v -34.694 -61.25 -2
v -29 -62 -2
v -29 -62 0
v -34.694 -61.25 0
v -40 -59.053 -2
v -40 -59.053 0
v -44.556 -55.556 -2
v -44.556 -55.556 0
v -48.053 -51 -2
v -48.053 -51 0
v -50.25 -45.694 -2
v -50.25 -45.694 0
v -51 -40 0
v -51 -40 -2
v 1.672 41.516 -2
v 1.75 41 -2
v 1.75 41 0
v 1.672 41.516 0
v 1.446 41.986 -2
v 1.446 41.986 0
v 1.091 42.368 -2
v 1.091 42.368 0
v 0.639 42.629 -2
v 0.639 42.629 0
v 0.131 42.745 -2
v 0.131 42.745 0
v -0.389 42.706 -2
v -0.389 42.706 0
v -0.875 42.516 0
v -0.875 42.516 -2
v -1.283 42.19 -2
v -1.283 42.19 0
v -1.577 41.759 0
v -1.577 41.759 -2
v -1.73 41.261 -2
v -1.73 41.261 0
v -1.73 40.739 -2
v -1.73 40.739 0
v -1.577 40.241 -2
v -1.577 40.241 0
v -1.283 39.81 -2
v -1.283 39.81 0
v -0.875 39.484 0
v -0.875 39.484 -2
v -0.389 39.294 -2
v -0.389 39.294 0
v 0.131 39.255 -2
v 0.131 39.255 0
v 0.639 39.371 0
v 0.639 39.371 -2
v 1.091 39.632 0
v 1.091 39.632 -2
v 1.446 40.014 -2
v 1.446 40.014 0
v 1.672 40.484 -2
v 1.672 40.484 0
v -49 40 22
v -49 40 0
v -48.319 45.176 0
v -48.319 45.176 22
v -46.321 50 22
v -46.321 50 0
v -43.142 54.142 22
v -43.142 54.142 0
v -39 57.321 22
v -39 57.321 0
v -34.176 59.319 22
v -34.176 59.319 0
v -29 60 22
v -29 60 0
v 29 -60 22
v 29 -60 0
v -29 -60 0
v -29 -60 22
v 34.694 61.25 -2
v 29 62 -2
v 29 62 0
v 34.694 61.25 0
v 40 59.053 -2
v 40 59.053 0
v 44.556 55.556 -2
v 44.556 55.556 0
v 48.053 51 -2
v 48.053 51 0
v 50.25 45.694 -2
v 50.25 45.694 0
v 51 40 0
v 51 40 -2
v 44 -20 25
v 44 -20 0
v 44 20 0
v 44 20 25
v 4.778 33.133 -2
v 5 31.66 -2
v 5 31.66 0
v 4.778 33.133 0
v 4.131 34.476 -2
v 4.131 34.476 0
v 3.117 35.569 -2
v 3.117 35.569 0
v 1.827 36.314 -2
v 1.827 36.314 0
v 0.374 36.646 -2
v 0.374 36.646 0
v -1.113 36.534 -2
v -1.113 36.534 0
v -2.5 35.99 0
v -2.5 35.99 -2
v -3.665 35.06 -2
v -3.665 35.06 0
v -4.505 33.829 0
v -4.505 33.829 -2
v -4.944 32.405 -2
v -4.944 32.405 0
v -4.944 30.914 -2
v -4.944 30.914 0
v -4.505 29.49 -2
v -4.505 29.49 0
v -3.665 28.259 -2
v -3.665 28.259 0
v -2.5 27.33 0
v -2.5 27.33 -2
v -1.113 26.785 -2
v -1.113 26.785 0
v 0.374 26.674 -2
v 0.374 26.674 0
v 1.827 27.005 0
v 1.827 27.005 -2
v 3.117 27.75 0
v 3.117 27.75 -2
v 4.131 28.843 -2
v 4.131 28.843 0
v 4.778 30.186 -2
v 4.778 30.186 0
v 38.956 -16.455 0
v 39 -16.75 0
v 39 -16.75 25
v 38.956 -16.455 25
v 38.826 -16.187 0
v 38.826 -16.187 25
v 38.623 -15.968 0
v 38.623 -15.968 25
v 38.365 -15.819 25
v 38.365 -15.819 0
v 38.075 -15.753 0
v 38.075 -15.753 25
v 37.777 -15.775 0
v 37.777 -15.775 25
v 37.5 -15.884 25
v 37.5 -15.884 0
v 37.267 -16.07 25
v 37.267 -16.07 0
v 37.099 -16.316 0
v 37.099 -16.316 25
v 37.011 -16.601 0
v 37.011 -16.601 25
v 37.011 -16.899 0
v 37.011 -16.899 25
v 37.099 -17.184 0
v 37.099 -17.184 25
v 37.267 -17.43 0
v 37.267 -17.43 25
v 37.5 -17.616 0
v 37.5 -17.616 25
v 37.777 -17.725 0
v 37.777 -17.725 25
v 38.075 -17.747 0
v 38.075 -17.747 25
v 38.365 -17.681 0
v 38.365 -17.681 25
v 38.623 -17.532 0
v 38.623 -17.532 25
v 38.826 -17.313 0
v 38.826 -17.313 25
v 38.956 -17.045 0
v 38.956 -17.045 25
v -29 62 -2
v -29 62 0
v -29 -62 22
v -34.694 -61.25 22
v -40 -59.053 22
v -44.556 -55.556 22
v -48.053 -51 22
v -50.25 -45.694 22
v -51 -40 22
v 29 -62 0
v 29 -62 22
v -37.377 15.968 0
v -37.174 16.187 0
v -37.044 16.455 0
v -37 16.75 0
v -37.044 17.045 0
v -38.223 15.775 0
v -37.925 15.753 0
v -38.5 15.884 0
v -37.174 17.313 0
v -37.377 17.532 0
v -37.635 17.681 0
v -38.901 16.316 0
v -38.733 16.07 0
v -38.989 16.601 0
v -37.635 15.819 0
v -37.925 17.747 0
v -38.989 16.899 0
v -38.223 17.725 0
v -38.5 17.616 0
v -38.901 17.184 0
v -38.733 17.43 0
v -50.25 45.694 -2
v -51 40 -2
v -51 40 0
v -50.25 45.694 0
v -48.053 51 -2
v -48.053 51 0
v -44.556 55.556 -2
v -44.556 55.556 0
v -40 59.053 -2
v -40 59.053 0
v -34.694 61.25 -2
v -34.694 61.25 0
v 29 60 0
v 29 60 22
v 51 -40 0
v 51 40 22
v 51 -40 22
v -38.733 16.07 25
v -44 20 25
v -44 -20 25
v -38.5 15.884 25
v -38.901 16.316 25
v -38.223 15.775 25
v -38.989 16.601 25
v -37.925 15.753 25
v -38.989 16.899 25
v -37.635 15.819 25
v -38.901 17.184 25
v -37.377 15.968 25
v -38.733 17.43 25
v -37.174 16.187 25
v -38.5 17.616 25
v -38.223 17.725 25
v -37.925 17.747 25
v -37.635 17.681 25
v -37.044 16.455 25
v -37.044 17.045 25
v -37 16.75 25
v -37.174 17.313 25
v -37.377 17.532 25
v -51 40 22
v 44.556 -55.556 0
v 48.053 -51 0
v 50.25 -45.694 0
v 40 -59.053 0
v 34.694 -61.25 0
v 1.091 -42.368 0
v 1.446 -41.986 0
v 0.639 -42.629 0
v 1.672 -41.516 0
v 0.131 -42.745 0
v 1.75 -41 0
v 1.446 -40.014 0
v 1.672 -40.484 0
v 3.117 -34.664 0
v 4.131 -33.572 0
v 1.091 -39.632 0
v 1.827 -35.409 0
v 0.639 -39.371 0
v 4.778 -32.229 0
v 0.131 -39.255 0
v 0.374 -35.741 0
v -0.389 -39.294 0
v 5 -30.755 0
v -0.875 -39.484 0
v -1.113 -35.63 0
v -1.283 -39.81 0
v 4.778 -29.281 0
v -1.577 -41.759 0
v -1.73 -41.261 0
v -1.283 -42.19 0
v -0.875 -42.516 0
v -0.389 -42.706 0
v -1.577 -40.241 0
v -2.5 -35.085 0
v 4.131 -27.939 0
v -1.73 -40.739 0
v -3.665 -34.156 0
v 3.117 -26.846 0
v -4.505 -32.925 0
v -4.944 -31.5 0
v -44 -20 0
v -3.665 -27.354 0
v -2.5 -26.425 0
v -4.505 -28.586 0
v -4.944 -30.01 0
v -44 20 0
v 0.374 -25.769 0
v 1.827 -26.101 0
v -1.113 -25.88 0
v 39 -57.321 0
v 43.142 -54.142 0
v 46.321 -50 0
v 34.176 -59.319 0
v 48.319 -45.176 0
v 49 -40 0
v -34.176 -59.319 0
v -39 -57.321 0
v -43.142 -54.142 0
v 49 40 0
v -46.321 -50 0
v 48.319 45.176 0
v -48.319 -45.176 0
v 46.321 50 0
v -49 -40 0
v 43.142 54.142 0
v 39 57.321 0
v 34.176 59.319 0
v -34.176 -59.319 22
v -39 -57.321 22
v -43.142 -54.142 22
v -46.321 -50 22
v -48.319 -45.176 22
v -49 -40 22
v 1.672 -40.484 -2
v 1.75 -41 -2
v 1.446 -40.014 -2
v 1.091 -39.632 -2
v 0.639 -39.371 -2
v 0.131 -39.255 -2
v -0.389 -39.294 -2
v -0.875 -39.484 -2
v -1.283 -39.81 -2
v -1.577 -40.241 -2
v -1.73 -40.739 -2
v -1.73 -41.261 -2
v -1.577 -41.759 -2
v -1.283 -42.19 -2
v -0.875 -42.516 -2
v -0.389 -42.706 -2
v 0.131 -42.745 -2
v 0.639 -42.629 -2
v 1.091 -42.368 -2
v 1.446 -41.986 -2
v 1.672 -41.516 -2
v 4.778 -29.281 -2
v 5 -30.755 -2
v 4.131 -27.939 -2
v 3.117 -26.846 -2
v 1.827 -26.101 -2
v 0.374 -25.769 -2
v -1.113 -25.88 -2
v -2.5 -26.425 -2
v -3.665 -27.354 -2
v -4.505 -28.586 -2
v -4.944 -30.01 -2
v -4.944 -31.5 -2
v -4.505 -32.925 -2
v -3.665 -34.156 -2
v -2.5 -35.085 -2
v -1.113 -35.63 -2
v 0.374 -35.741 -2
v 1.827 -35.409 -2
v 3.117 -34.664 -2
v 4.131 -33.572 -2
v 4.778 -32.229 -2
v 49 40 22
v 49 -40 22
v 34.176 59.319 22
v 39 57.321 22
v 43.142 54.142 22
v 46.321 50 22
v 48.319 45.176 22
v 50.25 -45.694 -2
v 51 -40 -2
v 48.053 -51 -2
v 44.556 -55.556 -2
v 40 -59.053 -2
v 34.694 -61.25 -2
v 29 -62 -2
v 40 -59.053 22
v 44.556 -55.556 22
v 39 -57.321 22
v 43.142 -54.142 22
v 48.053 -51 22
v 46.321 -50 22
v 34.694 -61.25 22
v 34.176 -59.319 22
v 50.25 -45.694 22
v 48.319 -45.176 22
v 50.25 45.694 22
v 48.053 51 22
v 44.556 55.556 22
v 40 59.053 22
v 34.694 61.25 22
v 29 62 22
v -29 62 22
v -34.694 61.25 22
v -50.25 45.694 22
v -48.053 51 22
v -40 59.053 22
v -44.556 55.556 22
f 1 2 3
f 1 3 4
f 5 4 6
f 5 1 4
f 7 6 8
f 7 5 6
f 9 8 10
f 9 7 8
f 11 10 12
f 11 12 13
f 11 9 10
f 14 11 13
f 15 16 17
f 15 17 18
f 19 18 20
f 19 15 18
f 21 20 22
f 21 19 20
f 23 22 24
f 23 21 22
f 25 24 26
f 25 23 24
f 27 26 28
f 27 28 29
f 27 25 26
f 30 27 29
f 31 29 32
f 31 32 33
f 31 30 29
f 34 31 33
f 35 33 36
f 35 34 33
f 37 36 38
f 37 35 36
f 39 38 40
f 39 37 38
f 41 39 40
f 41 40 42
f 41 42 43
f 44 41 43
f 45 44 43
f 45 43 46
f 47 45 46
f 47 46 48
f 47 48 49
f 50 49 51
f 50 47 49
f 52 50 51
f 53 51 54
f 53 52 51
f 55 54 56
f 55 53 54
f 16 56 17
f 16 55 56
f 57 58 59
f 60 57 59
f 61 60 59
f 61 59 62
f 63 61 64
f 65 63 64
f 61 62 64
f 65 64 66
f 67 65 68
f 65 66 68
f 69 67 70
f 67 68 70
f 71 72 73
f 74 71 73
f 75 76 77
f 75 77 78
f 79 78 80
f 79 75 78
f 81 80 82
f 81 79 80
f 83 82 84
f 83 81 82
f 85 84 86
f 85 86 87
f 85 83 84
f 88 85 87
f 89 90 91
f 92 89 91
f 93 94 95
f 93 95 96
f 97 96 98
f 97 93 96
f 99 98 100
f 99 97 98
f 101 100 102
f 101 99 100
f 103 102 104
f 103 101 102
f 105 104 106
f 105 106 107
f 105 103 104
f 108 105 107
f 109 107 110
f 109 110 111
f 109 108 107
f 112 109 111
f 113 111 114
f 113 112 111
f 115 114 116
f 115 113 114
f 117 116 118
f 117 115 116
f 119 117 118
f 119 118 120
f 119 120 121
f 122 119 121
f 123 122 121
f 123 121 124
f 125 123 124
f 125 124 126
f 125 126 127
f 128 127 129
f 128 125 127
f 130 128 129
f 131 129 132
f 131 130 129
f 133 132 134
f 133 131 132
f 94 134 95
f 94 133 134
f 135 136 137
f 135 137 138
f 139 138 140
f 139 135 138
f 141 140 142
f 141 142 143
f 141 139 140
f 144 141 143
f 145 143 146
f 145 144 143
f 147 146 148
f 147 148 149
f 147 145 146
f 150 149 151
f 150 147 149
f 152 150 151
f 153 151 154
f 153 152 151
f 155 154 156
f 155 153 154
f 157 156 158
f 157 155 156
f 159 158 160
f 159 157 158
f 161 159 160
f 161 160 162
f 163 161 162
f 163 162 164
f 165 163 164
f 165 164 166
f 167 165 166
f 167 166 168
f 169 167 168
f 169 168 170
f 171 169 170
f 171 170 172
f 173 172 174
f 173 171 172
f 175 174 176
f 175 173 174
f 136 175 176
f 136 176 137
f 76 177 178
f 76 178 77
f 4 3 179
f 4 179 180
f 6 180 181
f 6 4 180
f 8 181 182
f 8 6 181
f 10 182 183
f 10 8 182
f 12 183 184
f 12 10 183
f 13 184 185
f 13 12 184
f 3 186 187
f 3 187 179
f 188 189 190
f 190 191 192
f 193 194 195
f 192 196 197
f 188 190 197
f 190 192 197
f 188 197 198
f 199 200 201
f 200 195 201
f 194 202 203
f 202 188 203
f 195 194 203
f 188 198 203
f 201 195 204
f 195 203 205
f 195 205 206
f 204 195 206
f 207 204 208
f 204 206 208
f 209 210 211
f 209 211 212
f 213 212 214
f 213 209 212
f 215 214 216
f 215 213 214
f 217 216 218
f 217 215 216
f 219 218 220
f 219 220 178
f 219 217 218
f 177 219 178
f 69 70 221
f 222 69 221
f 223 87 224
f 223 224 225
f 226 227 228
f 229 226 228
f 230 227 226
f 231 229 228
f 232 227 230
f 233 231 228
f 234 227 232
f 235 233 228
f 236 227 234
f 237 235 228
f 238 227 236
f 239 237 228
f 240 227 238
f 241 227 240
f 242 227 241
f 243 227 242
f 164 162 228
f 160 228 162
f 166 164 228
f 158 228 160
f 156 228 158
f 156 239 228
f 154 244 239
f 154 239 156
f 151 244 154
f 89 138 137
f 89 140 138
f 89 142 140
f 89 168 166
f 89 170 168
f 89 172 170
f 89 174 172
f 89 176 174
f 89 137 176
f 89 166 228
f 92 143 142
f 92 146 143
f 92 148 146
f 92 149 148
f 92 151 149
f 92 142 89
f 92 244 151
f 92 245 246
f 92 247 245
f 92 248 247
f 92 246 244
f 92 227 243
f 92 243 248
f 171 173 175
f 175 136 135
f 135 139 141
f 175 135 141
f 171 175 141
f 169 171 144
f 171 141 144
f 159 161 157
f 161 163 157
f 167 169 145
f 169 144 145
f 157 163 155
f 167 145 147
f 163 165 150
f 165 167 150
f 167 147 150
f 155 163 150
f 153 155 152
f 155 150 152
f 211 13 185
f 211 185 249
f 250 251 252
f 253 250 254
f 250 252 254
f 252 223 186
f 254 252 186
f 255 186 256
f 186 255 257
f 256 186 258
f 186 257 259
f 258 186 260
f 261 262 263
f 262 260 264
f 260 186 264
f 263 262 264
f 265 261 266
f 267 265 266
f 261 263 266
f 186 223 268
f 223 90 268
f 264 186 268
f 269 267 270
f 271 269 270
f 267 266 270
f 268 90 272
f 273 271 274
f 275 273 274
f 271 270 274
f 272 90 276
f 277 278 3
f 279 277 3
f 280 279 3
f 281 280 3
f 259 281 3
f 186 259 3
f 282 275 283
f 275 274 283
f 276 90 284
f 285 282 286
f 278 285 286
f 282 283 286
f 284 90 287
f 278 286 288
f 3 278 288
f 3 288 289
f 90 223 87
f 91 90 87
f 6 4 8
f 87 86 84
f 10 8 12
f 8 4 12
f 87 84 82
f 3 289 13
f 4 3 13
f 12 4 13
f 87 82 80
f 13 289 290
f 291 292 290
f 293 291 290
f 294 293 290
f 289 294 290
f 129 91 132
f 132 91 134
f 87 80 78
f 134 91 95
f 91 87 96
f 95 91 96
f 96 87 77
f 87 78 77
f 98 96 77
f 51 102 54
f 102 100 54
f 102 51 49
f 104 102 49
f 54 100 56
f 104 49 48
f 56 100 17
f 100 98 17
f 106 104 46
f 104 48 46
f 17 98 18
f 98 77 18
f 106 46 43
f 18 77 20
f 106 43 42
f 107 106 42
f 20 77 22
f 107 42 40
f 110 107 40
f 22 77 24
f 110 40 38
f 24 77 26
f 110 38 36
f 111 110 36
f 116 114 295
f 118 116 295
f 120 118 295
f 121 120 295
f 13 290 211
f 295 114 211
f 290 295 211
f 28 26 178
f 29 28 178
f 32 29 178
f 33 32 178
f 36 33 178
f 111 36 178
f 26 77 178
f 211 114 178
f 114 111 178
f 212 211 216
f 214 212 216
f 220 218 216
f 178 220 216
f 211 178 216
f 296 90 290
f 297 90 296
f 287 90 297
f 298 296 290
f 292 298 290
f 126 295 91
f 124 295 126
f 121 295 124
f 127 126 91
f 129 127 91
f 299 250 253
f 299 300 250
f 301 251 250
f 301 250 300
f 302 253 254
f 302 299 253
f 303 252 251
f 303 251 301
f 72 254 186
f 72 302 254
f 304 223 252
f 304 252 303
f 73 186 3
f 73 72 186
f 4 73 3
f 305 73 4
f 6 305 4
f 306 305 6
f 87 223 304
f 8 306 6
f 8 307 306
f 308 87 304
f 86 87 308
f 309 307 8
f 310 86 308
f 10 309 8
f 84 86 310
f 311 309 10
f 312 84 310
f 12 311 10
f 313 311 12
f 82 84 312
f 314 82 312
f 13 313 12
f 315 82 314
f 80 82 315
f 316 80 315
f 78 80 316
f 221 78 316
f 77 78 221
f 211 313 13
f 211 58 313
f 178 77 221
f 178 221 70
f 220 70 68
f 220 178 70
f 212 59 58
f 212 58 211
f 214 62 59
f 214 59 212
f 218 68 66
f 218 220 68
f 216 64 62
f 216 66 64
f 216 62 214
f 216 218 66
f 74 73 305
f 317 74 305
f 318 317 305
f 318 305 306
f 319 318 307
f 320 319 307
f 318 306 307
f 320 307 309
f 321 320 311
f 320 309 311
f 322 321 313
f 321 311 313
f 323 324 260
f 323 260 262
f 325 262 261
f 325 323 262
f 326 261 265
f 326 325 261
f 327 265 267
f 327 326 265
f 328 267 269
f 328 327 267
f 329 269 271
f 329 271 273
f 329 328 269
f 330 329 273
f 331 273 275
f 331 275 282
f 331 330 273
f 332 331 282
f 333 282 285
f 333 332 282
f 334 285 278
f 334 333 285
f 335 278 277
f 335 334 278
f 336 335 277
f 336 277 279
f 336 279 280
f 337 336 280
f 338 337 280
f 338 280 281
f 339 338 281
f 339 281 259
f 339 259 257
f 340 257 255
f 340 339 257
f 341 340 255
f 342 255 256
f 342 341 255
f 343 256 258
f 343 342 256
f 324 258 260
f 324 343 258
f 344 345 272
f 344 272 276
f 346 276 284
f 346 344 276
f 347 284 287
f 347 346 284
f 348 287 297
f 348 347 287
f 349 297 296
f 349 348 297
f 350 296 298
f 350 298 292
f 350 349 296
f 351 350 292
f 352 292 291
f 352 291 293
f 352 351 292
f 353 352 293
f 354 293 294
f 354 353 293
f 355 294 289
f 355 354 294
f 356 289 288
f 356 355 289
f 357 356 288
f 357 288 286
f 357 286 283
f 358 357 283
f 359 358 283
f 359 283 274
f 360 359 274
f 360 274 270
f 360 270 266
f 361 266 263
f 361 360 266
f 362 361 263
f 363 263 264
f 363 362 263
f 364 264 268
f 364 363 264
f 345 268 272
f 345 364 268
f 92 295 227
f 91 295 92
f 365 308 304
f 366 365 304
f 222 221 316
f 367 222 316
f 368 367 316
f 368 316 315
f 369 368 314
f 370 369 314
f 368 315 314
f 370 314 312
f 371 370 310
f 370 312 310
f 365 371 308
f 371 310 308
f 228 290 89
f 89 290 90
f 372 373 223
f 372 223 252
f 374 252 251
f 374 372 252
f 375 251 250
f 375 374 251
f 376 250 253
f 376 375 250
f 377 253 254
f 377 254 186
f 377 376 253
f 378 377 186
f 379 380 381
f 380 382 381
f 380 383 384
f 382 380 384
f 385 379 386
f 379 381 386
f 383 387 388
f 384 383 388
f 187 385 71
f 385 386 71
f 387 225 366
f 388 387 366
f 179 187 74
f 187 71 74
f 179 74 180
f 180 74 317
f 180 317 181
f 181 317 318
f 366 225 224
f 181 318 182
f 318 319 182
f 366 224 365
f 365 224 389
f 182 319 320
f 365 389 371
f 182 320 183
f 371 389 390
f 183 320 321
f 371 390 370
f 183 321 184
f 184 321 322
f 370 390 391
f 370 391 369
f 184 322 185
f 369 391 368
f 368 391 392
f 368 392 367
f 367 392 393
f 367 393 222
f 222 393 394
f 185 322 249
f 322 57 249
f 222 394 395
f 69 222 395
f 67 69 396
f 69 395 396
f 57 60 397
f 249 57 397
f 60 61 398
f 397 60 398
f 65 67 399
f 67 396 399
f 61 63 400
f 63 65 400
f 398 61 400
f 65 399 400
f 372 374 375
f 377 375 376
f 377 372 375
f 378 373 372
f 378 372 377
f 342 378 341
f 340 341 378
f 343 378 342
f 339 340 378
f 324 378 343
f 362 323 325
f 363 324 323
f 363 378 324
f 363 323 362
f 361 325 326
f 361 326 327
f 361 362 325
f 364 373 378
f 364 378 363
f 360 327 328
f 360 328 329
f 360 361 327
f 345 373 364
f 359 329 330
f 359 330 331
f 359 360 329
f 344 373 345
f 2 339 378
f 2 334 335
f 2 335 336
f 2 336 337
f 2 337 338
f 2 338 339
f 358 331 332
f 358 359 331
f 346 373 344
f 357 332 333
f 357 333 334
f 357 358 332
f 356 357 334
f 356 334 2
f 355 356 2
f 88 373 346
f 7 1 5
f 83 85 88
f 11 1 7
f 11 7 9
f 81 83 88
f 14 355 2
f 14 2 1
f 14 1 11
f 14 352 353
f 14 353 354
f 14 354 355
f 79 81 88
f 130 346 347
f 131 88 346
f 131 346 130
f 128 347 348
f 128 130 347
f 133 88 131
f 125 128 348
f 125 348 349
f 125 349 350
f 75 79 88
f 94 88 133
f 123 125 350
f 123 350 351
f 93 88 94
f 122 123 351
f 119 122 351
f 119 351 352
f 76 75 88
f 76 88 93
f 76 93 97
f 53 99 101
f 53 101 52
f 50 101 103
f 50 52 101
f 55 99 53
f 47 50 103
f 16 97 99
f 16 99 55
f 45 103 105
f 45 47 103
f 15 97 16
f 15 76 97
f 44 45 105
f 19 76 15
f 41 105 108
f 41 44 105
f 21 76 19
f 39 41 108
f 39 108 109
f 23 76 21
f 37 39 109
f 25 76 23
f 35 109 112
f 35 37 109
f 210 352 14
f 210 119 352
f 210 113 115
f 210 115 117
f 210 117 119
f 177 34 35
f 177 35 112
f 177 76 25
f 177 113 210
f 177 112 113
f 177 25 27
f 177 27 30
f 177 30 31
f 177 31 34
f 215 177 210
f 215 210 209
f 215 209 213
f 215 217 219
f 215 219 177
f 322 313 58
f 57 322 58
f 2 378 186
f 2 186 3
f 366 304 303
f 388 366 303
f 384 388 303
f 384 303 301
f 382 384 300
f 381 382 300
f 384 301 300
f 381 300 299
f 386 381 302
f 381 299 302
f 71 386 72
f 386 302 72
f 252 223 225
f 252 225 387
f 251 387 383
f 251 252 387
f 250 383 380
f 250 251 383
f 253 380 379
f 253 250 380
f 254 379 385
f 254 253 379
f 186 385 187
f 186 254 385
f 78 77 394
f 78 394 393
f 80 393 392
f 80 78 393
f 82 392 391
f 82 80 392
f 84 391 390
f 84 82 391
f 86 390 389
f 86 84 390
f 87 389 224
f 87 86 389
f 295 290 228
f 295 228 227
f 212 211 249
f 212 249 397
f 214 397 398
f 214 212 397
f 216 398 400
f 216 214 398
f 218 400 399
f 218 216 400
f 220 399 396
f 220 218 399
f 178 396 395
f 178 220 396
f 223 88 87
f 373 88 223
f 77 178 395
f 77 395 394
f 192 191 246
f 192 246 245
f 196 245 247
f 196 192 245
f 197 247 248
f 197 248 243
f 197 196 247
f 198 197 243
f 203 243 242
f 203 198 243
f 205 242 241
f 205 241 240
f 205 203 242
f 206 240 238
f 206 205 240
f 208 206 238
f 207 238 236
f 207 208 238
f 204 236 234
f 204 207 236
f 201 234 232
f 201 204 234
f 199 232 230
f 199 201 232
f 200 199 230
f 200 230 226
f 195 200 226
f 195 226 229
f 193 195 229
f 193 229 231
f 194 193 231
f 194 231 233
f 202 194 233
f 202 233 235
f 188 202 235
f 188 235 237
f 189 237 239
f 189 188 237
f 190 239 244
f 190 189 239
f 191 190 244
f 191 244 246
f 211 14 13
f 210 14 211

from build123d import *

# Parameters (mm, degrees)
BOSS_EXTRUDE1_DEPTH = 22
SKETCH3_W           = 88
SKETCH3_H           = 40
SKETCH3_R           = 1
BOSS_EXTRUDE2_DEPTH = 25
BOSS_EXTRUDE3_START = -2
SKETCH6_R           = 1.75
SKETCH6_R_2         = 5
BOSS_EXTRUDE3_DEPTH = 2


with BuildPart() as part:
    # Sketch1 → Boss-Extrude1 (new body)
    with BuildSketch(Plane.XY):
        with BuildLine():
            Line((-29, 62), (29, 62))
            ThreePointArc((29, 62), (44.556349186, 55.556349186), (51, 40))
            Line((51, 40), (51, -40))
            ThreePointArc((51, -40), (44.556349186, -55.556349186), (29, -62))
            Line((29, -62), (-29, -62))
            ThreePointArc((-29, -62), (-44.556349186, -55.556349186), (-51, -40))
            Line((-51, -40), (-51, 40))
            ThreePointArc((-51, 40), (-44.556349186, 55.556349186), (-29, 62))
        make_face()
        with BuildLine():
            Line((-29, 60), (29, 60))
            ThreePointArc((29, 60), (43.142135624, 54.142135624), (49, 40))
            Line((49, 40), (49, -40))
            ThreePointArc((49, -40), (43.142135624, -54.142135624), (29, -60))
            Line((29, -60), (-29, -60))
            ThreePointArc((-29, -60), (-43.142135624, -54.142135624), (-49, -40))
            Line((-49, -40), (-49, 40))
            ThreePointArc((-49, 40), (-43.142135624, 54.142135624), (-29, 60))
        make_face(mode=Mode.SUBTRACT)
    extrude(amount=BOSS_EXTRUDE1_DEPTH)


with BuildPart() as body_2:
    # Sketch3 → Boss-Extrude2 (new body)
    with BuildSketch(Plane.XY):
        Rectangle(SKETCH3_W, SKETCH3_H)
        with Locations((-38, 16.75)):
            Circle(SKETCH3_R, mode=Mode.SUBTRACT)
        with Locations((38, -16.75)):
            Circle(SKETCH3_R, mode=Mode.SUBTRACT)
    extrude(amount=BOSS_EXTRUDE2_DEPTH)

    # Sketch6 → Boss-Extrude3 (add)
    with BuildSketch(Plane.XY.offset(BOSS_EXTRUDE3_START)):
        with BuildLine():
            Line((-29, 62), (29, 62))
            ThreePointArc((29, 62), (44.556349186, 55.556349186), (51, 40))
            Line((51, 40), (51, -40))
            ThreePointArc((51, -40), (44.556349186, -55.556349186), (29, -62))
            Line((29, -62), (-29, -62))
            ThreePointArc((-29, -62), (-44.556349186, -55.556349186), (-51, -40))
            Line((-51, -40), (-51, 40))
            ThreePointArc((-51, 40), (-44.556349186, 55.556349186), (-29, 62))
        make_face()
        with Locations((0, 41)):
            Circle(SKETCH6_R, mode=Mode.SUBTRACT)
        with Locations((0, -41)):
            Circle(SKETCH6_R, mode=Mode.SUBTRACT)
        with Locations((0, 31.659632999)):
            Circle(SKETCH6_R_2, mode=Mode.SUBTRACT)
        with Locations((0, -30.755120583)):
            Circle(SKETCH6_R_2, mode=Mode.SUBTRACT)
    extrude(amount=BOSS_EXTRUDE3_DEPTH)


solid = Compound([part.part, body_2.part])
